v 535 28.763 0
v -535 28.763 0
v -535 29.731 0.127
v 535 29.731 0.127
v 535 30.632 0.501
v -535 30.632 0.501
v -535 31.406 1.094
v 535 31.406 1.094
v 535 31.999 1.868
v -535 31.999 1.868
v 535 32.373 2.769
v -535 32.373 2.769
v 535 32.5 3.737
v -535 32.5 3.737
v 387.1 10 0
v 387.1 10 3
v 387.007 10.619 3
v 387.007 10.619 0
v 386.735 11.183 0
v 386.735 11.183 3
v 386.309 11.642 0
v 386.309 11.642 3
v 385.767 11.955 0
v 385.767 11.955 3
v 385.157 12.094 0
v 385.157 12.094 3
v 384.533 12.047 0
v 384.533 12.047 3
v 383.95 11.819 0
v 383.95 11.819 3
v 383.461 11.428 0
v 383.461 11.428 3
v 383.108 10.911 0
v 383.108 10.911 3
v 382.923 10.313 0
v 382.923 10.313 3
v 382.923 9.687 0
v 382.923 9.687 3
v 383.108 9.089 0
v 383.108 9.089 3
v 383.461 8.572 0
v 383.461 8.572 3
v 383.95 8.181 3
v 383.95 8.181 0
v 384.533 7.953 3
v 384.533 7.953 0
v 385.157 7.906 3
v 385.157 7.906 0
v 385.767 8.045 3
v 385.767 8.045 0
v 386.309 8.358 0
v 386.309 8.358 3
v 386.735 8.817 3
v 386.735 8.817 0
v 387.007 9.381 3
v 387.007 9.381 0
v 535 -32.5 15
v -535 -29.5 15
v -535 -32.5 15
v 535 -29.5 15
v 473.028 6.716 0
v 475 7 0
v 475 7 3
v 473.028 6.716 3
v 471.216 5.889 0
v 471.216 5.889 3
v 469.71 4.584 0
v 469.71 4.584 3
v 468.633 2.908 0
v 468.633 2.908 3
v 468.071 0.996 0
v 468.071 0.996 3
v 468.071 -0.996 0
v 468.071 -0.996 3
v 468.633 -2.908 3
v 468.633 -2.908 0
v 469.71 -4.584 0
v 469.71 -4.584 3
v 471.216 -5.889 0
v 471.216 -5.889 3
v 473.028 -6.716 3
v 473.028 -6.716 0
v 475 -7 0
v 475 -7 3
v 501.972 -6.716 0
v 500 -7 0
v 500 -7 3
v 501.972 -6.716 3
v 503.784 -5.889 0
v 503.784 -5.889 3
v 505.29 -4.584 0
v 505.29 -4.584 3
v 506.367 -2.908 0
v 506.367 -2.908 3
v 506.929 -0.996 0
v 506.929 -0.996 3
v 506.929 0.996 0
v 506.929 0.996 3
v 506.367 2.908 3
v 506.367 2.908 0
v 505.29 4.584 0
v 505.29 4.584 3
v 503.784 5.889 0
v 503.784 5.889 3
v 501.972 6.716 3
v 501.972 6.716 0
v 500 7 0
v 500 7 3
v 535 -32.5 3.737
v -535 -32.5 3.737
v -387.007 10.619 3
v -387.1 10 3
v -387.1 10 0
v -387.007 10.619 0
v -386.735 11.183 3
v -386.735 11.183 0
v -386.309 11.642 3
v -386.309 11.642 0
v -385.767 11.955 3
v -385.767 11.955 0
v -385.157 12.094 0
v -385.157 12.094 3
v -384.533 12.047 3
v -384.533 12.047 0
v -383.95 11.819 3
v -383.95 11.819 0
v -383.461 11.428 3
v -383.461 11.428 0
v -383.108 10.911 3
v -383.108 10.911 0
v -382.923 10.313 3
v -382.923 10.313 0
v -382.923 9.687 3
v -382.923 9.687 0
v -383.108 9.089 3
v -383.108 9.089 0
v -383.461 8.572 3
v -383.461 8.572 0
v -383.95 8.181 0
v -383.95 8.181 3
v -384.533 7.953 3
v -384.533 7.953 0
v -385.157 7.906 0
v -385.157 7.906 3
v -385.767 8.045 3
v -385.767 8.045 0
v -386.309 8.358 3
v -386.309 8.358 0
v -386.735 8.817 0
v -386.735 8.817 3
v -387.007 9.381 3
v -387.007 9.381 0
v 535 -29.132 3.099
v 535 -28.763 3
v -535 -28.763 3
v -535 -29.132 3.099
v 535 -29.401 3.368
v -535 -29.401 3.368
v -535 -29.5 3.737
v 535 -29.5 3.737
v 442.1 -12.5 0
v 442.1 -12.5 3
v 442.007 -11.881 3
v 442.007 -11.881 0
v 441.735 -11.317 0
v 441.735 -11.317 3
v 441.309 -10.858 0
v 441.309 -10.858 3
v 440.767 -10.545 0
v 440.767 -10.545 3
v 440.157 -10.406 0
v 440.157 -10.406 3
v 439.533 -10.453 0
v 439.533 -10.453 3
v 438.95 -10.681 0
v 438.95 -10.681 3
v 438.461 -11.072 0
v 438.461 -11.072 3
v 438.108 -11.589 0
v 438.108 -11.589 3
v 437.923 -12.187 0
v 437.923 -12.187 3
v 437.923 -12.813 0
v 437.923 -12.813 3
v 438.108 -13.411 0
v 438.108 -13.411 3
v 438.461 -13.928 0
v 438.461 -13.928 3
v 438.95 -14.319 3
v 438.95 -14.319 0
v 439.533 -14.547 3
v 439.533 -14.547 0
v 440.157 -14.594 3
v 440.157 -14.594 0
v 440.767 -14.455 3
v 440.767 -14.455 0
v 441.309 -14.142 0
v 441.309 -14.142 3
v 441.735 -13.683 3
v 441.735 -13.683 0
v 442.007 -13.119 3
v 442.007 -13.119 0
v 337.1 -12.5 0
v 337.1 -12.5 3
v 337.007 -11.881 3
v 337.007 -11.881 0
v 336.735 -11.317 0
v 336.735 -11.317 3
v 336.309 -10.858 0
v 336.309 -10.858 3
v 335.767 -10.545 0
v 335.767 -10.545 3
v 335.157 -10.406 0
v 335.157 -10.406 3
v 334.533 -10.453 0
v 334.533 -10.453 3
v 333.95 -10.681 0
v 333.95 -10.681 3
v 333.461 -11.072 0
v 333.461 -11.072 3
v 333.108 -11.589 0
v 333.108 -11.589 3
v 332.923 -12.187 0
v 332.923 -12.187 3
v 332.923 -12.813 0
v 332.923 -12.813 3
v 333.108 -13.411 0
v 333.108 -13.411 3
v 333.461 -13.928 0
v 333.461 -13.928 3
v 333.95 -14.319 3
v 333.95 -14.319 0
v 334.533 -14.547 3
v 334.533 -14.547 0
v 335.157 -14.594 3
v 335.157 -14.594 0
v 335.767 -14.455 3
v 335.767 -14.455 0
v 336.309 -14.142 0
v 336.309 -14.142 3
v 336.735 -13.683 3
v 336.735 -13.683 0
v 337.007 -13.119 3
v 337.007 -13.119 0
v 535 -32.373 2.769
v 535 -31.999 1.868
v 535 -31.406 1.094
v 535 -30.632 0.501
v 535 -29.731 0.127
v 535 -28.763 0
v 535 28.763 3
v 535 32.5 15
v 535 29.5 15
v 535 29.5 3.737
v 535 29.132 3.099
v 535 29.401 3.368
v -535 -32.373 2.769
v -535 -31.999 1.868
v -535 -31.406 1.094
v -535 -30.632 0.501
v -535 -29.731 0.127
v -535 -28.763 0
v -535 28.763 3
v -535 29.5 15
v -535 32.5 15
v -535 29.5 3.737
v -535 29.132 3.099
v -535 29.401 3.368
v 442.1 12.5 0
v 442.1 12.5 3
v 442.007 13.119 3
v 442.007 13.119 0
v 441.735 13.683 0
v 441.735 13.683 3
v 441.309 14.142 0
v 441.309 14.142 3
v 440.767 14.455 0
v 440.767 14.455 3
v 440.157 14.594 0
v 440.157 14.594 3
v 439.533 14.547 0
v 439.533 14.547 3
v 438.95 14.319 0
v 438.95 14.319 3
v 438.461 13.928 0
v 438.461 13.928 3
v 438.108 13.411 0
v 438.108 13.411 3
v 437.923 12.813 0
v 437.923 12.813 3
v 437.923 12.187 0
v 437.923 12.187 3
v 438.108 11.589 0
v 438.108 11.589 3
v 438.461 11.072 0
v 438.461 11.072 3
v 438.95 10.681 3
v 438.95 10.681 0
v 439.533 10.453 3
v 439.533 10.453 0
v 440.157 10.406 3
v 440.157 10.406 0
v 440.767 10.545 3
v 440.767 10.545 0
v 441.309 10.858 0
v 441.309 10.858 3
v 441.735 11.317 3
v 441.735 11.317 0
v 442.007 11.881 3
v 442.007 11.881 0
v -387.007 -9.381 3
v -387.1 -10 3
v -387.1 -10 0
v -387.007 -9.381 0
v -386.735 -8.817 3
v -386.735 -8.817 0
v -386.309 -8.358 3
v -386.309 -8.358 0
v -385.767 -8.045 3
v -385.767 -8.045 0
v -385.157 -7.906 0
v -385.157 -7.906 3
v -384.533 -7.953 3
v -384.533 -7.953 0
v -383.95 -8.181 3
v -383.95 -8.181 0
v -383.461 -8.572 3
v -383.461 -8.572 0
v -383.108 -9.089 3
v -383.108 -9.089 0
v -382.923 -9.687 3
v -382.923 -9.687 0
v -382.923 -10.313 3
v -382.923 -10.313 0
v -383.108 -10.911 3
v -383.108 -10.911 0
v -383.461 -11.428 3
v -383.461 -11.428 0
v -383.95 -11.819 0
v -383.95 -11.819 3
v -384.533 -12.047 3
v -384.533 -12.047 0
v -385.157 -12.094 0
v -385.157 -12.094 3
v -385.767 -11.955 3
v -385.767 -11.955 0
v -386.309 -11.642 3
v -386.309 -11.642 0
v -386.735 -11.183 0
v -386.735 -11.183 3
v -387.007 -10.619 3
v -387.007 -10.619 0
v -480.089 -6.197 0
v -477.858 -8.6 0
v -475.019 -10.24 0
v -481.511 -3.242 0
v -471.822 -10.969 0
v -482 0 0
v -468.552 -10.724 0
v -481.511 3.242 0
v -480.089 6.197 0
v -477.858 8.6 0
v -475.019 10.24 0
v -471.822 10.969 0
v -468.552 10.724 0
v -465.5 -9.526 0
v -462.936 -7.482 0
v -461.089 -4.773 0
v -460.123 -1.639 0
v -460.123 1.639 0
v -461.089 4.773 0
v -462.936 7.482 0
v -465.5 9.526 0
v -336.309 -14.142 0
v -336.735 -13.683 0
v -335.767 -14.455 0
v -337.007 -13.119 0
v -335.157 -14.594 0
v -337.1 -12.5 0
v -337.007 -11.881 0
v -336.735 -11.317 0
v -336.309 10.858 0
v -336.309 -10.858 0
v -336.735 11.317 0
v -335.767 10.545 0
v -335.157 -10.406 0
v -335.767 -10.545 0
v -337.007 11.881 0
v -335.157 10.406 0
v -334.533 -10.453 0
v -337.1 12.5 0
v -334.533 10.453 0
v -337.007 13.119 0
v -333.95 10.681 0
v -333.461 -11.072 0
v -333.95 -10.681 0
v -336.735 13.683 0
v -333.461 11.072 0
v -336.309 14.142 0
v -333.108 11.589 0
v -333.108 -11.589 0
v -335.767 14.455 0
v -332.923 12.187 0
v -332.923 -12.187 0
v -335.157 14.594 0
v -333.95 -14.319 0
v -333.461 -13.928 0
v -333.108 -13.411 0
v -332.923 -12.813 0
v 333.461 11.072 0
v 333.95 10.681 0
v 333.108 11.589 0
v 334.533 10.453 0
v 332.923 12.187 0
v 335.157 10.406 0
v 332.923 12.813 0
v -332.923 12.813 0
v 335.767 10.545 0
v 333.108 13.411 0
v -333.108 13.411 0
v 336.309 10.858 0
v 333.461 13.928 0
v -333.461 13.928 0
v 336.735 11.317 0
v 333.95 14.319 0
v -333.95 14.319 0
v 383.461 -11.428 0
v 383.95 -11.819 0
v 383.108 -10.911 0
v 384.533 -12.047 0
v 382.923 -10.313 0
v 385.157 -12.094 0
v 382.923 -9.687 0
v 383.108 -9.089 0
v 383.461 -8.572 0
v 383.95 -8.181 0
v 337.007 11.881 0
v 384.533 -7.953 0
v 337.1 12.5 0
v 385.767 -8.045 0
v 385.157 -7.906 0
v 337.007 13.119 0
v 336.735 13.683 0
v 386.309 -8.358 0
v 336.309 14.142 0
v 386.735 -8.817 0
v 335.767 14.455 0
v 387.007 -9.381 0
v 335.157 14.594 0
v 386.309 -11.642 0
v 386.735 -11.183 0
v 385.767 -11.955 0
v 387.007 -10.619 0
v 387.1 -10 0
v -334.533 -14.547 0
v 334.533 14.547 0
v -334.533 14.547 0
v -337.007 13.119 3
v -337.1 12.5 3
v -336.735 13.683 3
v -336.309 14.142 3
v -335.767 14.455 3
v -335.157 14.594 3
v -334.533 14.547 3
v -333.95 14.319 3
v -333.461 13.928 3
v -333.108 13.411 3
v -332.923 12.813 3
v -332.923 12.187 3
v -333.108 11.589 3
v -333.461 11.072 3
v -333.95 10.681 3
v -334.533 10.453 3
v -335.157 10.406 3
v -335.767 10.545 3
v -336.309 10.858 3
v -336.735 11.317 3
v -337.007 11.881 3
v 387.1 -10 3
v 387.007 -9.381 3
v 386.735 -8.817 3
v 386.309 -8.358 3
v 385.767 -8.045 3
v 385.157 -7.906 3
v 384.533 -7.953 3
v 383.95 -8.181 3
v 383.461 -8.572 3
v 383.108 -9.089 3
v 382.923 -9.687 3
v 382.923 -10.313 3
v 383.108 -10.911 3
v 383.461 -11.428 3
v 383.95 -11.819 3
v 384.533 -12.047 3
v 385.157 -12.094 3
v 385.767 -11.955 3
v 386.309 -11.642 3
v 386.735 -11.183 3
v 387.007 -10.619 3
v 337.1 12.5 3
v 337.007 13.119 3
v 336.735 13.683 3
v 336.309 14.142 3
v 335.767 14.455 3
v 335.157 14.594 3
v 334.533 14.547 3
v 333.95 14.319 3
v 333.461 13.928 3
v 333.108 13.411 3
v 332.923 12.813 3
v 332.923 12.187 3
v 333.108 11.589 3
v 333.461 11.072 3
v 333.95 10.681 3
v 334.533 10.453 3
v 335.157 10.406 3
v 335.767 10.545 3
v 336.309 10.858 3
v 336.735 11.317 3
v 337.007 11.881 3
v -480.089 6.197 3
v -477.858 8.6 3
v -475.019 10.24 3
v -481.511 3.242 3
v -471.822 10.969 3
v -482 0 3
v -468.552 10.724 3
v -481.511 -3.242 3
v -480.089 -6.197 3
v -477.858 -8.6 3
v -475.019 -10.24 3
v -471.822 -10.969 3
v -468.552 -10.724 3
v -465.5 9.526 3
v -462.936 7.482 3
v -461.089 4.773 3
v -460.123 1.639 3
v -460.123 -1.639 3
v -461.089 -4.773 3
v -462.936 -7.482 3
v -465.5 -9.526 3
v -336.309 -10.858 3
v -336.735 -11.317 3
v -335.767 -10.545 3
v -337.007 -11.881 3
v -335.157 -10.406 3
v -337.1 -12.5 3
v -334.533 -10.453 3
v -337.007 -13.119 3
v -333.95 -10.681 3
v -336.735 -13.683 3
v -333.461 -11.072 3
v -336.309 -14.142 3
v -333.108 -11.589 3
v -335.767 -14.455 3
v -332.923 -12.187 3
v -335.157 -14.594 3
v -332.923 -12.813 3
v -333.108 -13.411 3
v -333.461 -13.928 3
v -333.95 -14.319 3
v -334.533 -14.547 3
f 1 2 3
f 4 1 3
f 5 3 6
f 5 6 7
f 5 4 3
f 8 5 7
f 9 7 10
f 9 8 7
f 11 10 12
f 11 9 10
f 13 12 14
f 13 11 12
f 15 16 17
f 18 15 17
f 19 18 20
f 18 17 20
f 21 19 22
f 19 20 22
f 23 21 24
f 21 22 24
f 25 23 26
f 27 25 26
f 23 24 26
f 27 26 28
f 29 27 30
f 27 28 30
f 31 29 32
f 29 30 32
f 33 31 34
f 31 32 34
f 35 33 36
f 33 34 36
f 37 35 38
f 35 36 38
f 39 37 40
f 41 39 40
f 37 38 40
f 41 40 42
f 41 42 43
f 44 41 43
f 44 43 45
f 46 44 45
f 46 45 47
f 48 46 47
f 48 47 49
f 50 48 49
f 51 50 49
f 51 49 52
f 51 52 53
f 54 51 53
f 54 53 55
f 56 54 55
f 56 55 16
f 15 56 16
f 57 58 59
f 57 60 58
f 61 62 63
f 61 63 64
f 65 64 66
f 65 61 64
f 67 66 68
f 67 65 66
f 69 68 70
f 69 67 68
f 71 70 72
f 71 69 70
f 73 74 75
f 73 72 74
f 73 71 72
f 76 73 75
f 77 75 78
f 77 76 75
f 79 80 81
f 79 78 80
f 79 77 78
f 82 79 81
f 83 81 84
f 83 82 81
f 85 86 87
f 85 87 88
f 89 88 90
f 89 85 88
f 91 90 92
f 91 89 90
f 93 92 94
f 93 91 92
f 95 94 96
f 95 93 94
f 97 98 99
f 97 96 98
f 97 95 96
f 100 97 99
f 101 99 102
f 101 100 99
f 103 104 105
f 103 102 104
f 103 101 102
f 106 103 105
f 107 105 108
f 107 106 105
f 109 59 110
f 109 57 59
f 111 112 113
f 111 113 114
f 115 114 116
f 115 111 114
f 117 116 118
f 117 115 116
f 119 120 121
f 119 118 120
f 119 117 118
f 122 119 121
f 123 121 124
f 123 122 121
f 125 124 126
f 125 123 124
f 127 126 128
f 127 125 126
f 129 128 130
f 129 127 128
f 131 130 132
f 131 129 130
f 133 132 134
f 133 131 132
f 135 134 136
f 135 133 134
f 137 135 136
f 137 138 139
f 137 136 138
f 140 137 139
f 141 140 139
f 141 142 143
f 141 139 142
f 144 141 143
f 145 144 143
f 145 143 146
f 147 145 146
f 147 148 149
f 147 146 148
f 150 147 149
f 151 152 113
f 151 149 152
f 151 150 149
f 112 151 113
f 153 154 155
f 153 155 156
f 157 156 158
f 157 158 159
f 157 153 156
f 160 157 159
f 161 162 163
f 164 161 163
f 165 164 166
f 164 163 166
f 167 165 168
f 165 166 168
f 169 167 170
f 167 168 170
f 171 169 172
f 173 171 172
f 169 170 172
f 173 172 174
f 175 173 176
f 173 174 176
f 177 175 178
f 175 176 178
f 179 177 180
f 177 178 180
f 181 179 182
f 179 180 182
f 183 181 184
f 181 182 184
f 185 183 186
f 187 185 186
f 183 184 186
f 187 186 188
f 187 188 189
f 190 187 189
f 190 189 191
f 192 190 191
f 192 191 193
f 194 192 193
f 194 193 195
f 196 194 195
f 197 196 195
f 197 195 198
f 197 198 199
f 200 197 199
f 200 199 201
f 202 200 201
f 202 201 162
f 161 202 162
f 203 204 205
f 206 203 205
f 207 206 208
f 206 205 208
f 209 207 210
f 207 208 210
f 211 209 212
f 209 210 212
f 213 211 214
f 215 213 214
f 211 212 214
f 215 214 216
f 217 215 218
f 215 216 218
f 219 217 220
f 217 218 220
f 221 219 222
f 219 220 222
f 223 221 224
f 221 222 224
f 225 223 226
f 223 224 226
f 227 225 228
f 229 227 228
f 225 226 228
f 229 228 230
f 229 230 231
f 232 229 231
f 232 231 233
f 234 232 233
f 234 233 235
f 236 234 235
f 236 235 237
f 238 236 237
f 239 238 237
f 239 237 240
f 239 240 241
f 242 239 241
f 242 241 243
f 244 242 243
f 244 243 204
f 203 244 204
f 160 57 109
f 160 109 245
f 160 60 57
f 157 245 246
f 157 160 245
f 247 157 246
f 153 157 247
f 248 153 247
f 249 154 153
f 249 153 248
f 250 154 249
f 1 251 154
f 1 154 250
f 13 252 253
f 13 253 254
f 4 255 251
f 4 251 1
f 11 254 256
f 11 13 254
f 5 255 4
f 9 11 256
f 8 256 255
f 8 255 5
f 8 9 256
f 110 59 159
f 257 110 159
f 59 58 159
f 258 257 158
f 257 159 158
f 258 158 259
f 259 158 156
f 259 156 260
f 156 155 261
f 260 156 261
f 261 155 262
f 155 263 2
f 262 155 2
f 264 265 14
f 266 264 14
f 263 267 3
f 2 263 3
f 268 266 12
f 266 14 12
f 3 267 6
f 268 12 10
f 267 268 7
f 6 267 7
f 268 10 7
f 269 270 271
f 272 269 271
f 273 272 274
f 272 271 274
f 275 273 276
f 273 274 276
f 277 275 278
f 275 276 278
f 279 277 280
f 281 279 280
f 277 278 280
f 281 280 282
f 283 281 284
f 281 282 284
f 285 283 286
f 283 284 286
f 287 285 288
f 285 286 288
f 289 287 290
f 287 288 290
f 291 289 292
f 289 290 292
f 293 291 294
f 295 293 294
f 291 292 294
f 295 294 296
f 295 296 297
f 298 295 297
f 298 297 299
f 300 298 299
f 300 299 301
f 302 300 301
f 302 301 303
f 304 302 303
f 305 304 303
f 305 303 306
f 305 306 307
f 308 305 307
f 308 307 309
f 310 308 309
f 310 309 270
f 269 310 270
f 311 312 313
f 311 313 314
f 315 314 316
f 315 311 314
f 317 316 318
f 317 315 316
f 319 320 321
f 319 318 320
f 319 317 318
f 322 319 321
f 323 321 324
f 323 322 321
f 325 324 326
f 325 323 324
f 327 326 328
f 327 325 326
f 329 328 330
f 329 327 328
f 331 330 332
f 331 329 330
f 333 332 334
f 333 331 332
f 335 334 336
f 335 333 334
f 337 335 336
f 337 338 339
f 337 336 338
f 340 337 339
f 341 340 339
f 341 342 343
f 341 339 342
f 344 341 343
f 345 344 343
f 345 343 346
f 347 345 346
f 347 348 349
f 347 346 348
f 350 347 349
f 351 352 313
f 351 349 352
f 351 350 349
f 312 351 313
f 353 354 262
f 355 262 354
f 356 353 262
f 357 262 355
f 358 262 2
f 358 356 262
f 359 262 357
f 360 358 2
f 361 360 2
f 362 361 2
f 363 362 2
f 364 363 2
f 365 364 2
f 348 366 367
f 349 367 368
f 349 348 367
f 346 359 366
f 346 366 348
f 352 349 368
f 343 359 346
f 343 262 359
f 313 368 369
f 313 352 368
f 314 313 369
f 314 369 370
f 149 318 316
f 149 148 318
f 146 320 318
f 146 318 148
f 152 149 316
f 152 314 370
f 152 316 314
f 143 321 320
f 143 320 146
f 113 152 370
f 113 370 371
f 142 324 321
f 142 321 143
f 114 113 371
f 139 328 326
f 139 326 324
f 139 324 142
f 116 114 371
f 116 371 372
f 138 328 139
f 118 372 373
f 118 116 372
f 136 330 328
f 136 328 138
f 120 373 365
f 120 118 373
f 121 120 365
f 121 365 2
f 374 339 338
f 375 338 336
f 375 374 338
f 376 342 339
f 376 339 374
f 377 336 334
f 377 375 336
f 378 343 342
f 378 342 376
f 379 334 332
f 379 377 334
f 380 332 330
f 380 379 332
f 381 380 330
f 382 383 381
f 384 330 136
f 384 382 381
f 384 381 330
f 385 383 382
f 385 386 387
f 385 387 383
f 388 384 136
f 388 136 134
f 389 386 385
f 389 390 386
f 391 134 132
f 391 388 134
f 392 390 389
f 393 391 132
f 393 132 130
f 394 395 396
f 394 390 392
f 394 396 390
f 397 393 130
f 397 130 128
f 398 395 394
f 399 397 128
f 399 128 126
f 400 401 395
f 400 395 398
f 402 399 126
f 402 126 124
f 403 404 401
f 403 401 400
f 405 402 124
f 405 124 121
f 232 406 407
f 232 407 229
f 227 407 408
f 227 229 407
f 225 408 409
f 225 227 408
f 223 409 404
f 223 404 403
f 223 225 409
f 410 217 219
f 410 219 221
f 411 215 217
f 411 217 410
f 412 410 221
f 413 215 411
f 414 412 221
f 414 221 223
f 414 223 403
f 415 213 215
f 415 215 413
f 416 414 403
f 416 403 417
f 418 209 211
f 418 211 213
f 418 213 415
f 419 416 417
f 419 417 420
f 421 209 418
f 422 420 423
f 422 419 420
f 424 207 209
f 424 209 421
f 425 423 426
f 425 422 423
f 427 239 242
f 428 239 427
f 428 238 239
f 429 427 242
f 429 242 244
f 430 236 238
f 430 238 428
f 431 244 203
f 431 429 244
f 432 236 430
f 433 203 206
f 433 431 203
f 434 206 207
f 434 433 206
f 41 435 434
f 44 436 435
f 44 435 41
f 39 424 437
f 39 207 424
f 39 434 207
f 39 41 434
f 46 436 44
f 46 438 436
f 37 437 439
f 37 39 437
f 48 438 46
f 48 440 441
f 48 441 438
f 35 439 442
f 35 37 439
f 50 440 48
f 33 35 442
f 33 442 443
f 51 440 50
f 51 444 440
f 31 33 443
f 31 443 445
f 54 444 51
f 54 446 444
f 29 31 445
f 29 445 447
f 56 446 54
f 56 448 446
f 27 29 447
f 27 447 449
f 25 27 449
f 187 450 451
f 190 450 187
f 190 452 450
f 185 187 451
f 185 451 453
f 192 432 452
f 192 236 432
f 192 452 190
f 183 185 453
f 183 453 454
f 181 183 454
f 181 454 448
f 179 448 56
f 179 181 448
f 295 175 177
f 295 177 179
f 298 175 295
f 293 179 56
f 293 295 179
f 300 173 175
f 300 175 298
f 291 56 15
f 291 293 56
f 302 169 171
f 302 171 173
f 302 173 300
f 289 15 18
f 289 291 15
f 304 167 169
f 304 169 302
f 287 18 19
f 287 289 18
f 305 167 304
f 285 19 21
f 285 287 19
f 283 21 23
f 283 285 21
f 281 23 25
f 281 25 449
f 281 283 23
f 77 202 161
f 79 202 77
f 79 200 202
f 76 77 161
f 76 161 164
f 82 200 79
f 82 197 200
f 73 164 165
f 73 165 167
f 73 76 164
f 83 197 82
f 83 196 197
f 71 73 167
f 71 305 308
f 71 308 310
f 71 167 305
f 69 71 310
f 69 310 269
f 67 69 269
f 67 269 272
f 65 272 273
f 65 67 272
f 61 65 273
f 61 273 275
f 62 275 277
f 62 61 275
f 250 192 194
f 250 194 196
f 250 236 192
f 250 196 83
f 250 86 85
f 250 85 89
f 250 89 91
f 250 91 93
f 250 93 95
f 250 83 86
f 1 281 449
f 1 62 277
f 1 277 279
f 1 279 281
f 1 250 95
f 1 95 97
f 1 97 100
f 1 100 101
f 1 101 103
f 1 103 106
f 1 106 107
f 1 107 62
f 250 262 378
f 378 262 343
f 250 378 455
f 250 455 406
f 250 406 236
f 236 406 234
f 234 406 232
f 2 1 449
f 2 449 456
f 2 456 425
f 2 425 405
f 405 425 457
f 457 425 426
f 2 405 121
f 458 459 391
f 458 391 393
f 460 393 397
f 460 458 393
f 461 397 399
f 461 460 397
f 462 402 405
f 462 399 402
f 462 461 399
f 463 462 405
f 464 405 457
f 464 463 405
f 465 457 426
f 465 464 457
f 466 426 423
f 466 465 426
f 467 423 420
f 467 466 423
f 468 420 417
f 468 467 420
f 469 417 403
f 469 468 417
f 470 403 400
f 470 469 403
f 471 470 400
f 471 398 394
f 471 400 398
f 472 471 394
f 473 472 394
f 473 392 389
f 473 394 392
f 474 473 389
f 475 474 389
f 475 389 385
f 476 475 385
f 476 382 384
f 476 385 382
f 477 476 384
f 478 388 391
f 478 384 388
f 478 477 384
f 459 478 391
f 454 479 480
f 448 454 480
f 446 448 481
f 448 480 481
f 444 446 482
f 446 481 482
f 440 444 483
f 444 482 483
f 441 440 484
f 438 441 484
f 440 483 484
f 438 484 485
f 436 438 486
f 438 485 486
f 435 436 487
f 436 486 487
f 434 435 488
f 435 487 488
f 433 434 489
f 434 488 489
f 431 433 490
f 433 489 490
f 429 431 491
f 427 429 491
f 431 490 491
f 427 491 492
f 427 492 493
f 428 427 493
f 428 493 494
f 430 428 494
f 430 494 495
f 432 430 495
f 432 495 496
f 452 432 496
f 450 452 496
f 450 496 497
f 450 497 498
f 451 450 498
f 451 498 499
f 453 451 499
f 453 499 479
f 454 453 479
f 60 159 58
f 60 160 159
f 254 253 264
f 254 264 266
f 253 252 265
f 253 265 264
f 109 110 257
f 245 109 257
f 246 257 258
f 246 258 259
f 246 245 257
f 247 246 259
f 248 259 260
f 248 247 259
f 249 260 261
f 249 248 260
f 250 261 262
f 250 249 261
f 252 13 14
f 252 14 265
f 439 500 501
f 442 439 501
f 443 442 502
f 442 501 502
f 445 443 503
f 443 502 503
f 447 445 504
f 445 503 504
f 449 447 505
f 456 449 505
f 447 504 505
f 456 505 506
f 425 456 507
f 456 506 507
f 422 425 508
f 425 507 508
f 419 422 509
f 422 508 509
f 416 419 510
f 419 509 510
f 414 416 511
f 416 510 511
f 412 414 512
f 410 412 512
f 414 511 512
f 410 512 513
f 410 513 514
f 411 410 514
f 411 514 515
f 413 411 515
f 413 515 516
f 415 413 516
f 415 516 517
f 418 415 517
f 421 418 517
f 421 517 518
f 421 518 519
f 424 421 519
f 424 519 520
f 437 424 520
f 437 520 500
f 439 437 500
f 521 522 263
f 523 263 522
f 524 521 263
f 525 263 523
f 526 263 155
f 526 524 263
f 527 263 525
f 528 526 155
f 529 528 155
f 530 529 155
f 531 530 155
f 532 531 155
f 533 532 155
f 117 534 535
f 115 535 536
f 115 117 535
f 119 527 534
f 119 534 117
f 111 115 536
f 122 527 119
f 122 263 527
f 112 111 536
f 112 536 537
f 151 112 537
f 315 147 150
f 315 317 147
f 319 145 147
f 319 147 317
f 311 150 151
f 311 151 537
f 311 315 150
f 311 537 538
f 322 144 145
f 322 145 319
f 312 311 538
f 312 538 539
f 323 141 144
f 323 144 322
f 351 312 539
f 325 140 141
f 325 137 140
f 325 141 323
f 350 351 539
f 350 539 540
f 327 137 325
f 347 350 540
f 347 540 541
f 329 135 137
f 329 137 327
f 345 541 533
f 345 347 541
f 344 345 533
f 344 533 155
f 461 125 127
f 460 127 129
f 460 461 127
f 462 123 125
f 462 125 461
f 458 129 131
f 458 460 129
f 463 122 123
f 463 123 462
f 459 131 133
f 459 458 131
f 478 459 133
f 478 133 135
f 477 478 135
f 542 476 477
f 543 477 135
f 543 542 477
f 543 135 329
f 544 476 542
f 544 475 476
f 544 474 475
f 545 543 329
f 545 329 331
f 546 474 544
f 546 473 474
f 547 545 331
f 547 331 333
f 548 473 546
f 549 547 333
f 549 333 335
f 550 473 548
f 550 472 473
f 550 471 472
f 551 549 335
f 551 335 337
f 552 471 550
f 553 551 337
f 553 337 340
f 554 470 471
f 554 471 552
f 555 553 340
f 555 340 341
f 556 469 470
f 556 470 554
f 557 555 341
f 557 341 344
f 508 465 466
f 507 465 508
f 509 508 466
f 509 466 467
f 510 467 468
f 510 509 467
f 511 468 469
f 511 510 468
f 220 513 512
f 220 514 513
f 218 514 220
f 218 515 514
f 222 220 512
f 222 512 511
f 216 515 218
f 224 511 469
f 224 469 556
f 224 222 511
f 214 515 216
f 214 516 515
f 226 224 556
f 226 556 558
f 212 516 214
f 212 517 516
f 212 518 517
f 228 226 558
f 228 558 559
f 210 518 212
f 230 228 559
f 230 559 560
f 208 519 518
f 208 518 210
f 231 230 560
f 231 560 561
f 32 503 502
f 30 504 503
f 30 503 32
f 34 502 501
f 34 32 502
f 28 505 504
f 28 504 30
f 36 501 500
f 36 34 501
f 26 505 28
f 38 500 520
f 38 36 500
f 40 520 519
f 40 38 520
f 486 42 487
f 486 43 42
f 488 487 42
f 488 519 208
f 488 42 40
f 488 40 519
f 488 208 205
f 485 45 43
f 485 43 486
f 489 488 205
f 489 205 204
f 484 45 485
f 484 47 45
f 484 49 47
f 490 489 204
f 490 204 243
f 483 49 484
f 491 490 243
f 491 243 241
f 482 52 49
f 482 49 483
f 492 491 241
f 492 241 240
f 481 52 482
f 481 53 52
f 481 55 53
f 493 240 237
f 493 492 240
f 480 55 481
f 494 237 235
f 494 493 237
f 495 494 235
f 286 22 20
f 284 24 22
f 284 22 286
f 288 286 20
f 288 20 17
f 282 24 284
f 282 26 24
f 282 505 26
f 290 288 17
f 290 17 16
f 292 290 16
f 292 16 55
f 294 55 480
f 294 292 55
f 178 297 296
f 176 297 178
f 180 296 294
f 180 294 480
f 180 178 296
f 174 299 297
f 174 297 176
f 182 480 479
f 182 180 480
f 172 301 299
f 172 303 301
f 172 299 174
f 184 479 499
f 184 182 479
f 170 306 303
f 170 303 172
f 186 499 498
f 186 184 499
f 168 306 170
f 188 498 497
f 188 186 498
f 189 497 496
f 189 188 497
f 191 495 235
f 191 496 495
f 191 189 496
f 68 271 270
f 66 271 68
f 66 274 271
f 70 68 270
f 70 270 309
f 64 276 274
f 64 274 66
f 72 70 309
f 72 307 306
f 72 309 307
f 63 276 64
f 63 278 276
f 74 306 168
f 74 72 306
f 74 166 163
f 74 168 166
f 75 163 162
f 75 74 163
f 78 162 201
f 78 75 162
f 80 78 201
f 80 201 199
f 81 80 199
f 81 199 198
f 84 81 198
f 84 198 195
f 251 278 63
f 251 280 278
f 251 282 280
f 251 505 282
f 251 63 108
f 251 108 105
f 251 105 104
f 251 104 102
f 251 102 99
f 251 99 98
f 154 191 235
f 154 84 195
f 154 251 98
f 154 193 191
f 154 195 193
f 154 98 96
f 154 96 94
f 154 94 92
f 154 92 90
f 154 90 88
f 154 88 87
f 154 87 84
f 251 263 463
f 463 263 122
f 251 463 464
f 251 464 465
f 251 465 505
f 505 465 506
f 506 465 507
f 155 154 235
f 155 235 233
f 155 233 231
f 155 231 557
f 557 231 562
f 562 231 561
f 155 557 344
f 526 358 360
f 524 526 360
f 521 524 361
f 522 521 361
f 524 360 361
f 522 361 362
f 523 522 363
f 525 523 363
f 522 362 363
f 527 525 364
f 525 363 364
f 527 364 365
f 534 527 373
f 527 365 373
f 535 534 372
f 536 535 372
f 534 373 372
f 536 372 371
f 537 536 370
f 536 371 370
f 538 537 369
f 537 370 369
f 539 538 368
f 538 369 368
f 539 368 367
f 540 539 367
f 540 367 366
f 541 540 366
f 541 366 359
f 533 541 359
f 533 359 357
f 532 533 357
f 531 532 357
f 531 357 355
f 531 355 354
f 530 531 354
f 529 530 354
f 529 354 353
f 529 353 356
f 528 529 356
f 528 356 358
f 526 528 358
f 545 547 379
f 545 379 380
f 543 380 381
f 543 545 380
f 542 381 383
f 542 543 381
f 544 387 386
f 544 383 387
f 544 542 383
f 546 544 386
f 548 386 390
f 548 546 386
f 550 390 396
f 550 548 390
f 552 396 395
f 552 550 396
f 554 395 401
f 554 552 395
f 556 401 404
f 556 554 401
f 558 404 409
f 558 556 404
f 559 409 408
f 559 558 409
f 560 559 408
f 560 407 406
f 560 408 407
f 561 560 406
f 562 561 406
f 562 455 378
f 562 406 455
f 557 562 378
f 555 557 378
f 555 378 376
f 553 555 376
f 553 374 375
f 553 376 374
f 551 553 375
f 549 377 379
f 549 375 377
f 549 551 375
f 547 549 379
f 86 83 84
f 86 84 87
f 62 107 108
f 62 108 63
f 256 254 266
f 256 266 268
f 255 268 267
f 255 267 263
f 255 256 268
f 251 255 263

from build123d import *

# Parameters (mm, degrees)
TABAN_FLAN_1_DEPTH    = 535
KES_EKSTR_ZYON1_DEPTH = 10
M5_DI_LI_DELIK1_D     = 4.2
M5_DI_LI_DELIK2_D     = 4.2
M5_DI_LI_DELIK3_D     = 4.2
IZIM13_R              = 11
KES_EKSTR_ZYON2_DEPTH = 10


# Sheet-metal steps are written as plain solids
with BuildPart() as part:
    # Çizim1 → Taban-Flanş1 (new, symmetric)
    with BuildSketch(Plane(origin=(0, 0, 0), x_dir=(0, 0, -1), z_dir=(1, 0, 0))):
        with BuildLine():
            Line((-15, -32.5), (-3.7366, -32.5))
            ThreePointArc((-3.7366, -32.5), (-1.094424801, -31.405575199), (0, -28.7634))
            Line((0, -28.7634), (0, 28.7634))
            ThreePointArc((0, 28.7634), (-1.094424801, 31.405575199), (-3.7366, 32.5))
            Line((-3.7366, 32.5), (-15, 32.5))
            Line((-15, 32.5), (-15, 29.5))
            Line((-15, 29.5), (-3.7366, 29.5))
            ThreePointArc((-3.7366, 29.5), (-3.215745145, 29.284254855), (-3, 28.7634))
            Line((-3, 28.7634), (-3, -28.7634))
            ThreePointArc((-3, -28.7634), (-3.215745145, -29.284254855), (-3.7366, -29.5))
            Line((-3.7366, -29.5), (-15, -29.5))
            Line((-15, -29.5), (-15, -32.5))
        make_face()
    extrude(amount=TABAN_FLAN_1_DEPTH, both=True)

    # Çizim6 → Kes-Ekstrüzyon1 (cut)
    with BuildSketch(Plane(origin=(0, 0, 0), x_dir=(-1, 0, 0), z_dir=(0, 0, -1))):
        with BuildLine():
            Line((-500, 7), (-475, 7))
            ThreePointArc((-475, 7), (-468, 0), (-475, -7))
            Line((-475, -7), (-500, -7))
            ThreePointArc((-500, -7), (-507, 0), (-500, 7))
        make_face()
    extrude(amount=-KES_EKSTR_ZYON1_DEPTH, mode=Mode.SUBTRACT)

    # M5 Dişli Delik1 (through all)
    with Locations(Plane(origin=(440, 12.5, 0), x_dir=(-1, 0, 0), z_dir=(0, 0, -1))):
        with Locations((0, 0), (0, -25)):
            Hole(M5_DI_LI_DELIK1_D / 2)

    # M5 Dişli Delik2 (through all)
    with Locations(Plane(origin=(385, 10, 0), x_dir=(-1, 0, 0), z_dir=(0, 0, -1))):
        with Locations((0, 0), (0, -20)):
            m5_di_li_delik2 = Hole(M5_DI_LI_DELIK2_D / 2)

    # M5 Dişli Delik3 (through all)
    with Locations(Plane(origin=(335, 12.5, 0), x_dir=(-1, 0, 0), z_dir=(0, 0, -1))):
        with Locations((0, 0), (0, -25)):
            m5_di_li_delik3 = Hole(M5_DI_LI_DELIK3_D / 2)

    # Aynalama1: M5 Dişli Delik2, M5 Dişli Delik3 across plane
    add(m5_di_li_delik2.mirror(Plane(origin=(0, 0, 0), x_dir=(0, 0, 1), z_dir=(1, 0, 0))), mode=Mode.SUBTRACT)
    add(m5_di_li_delik3.mirror(Plane(origin=(0, 0, 0), x_dir=(0, 0, 1), z_dir=(1, 0, 0))), mode=Mode.SUBTRACT)

    # Çizim13 → Kes-Ekstrüzyon2 (cut)
    with BuildSketch(Plane(origin=(0, 0, 0), x_dir=(-1, 0, 0), z_dir=(0, 0, -1))):
        with Locations((471, 0)):
            Circle(IZIM13_R)
    extrude(amount=-KES_EKSTR_ZYON2_DEPTH, mode=Mode.SUBTRACT)


solid = part.part
